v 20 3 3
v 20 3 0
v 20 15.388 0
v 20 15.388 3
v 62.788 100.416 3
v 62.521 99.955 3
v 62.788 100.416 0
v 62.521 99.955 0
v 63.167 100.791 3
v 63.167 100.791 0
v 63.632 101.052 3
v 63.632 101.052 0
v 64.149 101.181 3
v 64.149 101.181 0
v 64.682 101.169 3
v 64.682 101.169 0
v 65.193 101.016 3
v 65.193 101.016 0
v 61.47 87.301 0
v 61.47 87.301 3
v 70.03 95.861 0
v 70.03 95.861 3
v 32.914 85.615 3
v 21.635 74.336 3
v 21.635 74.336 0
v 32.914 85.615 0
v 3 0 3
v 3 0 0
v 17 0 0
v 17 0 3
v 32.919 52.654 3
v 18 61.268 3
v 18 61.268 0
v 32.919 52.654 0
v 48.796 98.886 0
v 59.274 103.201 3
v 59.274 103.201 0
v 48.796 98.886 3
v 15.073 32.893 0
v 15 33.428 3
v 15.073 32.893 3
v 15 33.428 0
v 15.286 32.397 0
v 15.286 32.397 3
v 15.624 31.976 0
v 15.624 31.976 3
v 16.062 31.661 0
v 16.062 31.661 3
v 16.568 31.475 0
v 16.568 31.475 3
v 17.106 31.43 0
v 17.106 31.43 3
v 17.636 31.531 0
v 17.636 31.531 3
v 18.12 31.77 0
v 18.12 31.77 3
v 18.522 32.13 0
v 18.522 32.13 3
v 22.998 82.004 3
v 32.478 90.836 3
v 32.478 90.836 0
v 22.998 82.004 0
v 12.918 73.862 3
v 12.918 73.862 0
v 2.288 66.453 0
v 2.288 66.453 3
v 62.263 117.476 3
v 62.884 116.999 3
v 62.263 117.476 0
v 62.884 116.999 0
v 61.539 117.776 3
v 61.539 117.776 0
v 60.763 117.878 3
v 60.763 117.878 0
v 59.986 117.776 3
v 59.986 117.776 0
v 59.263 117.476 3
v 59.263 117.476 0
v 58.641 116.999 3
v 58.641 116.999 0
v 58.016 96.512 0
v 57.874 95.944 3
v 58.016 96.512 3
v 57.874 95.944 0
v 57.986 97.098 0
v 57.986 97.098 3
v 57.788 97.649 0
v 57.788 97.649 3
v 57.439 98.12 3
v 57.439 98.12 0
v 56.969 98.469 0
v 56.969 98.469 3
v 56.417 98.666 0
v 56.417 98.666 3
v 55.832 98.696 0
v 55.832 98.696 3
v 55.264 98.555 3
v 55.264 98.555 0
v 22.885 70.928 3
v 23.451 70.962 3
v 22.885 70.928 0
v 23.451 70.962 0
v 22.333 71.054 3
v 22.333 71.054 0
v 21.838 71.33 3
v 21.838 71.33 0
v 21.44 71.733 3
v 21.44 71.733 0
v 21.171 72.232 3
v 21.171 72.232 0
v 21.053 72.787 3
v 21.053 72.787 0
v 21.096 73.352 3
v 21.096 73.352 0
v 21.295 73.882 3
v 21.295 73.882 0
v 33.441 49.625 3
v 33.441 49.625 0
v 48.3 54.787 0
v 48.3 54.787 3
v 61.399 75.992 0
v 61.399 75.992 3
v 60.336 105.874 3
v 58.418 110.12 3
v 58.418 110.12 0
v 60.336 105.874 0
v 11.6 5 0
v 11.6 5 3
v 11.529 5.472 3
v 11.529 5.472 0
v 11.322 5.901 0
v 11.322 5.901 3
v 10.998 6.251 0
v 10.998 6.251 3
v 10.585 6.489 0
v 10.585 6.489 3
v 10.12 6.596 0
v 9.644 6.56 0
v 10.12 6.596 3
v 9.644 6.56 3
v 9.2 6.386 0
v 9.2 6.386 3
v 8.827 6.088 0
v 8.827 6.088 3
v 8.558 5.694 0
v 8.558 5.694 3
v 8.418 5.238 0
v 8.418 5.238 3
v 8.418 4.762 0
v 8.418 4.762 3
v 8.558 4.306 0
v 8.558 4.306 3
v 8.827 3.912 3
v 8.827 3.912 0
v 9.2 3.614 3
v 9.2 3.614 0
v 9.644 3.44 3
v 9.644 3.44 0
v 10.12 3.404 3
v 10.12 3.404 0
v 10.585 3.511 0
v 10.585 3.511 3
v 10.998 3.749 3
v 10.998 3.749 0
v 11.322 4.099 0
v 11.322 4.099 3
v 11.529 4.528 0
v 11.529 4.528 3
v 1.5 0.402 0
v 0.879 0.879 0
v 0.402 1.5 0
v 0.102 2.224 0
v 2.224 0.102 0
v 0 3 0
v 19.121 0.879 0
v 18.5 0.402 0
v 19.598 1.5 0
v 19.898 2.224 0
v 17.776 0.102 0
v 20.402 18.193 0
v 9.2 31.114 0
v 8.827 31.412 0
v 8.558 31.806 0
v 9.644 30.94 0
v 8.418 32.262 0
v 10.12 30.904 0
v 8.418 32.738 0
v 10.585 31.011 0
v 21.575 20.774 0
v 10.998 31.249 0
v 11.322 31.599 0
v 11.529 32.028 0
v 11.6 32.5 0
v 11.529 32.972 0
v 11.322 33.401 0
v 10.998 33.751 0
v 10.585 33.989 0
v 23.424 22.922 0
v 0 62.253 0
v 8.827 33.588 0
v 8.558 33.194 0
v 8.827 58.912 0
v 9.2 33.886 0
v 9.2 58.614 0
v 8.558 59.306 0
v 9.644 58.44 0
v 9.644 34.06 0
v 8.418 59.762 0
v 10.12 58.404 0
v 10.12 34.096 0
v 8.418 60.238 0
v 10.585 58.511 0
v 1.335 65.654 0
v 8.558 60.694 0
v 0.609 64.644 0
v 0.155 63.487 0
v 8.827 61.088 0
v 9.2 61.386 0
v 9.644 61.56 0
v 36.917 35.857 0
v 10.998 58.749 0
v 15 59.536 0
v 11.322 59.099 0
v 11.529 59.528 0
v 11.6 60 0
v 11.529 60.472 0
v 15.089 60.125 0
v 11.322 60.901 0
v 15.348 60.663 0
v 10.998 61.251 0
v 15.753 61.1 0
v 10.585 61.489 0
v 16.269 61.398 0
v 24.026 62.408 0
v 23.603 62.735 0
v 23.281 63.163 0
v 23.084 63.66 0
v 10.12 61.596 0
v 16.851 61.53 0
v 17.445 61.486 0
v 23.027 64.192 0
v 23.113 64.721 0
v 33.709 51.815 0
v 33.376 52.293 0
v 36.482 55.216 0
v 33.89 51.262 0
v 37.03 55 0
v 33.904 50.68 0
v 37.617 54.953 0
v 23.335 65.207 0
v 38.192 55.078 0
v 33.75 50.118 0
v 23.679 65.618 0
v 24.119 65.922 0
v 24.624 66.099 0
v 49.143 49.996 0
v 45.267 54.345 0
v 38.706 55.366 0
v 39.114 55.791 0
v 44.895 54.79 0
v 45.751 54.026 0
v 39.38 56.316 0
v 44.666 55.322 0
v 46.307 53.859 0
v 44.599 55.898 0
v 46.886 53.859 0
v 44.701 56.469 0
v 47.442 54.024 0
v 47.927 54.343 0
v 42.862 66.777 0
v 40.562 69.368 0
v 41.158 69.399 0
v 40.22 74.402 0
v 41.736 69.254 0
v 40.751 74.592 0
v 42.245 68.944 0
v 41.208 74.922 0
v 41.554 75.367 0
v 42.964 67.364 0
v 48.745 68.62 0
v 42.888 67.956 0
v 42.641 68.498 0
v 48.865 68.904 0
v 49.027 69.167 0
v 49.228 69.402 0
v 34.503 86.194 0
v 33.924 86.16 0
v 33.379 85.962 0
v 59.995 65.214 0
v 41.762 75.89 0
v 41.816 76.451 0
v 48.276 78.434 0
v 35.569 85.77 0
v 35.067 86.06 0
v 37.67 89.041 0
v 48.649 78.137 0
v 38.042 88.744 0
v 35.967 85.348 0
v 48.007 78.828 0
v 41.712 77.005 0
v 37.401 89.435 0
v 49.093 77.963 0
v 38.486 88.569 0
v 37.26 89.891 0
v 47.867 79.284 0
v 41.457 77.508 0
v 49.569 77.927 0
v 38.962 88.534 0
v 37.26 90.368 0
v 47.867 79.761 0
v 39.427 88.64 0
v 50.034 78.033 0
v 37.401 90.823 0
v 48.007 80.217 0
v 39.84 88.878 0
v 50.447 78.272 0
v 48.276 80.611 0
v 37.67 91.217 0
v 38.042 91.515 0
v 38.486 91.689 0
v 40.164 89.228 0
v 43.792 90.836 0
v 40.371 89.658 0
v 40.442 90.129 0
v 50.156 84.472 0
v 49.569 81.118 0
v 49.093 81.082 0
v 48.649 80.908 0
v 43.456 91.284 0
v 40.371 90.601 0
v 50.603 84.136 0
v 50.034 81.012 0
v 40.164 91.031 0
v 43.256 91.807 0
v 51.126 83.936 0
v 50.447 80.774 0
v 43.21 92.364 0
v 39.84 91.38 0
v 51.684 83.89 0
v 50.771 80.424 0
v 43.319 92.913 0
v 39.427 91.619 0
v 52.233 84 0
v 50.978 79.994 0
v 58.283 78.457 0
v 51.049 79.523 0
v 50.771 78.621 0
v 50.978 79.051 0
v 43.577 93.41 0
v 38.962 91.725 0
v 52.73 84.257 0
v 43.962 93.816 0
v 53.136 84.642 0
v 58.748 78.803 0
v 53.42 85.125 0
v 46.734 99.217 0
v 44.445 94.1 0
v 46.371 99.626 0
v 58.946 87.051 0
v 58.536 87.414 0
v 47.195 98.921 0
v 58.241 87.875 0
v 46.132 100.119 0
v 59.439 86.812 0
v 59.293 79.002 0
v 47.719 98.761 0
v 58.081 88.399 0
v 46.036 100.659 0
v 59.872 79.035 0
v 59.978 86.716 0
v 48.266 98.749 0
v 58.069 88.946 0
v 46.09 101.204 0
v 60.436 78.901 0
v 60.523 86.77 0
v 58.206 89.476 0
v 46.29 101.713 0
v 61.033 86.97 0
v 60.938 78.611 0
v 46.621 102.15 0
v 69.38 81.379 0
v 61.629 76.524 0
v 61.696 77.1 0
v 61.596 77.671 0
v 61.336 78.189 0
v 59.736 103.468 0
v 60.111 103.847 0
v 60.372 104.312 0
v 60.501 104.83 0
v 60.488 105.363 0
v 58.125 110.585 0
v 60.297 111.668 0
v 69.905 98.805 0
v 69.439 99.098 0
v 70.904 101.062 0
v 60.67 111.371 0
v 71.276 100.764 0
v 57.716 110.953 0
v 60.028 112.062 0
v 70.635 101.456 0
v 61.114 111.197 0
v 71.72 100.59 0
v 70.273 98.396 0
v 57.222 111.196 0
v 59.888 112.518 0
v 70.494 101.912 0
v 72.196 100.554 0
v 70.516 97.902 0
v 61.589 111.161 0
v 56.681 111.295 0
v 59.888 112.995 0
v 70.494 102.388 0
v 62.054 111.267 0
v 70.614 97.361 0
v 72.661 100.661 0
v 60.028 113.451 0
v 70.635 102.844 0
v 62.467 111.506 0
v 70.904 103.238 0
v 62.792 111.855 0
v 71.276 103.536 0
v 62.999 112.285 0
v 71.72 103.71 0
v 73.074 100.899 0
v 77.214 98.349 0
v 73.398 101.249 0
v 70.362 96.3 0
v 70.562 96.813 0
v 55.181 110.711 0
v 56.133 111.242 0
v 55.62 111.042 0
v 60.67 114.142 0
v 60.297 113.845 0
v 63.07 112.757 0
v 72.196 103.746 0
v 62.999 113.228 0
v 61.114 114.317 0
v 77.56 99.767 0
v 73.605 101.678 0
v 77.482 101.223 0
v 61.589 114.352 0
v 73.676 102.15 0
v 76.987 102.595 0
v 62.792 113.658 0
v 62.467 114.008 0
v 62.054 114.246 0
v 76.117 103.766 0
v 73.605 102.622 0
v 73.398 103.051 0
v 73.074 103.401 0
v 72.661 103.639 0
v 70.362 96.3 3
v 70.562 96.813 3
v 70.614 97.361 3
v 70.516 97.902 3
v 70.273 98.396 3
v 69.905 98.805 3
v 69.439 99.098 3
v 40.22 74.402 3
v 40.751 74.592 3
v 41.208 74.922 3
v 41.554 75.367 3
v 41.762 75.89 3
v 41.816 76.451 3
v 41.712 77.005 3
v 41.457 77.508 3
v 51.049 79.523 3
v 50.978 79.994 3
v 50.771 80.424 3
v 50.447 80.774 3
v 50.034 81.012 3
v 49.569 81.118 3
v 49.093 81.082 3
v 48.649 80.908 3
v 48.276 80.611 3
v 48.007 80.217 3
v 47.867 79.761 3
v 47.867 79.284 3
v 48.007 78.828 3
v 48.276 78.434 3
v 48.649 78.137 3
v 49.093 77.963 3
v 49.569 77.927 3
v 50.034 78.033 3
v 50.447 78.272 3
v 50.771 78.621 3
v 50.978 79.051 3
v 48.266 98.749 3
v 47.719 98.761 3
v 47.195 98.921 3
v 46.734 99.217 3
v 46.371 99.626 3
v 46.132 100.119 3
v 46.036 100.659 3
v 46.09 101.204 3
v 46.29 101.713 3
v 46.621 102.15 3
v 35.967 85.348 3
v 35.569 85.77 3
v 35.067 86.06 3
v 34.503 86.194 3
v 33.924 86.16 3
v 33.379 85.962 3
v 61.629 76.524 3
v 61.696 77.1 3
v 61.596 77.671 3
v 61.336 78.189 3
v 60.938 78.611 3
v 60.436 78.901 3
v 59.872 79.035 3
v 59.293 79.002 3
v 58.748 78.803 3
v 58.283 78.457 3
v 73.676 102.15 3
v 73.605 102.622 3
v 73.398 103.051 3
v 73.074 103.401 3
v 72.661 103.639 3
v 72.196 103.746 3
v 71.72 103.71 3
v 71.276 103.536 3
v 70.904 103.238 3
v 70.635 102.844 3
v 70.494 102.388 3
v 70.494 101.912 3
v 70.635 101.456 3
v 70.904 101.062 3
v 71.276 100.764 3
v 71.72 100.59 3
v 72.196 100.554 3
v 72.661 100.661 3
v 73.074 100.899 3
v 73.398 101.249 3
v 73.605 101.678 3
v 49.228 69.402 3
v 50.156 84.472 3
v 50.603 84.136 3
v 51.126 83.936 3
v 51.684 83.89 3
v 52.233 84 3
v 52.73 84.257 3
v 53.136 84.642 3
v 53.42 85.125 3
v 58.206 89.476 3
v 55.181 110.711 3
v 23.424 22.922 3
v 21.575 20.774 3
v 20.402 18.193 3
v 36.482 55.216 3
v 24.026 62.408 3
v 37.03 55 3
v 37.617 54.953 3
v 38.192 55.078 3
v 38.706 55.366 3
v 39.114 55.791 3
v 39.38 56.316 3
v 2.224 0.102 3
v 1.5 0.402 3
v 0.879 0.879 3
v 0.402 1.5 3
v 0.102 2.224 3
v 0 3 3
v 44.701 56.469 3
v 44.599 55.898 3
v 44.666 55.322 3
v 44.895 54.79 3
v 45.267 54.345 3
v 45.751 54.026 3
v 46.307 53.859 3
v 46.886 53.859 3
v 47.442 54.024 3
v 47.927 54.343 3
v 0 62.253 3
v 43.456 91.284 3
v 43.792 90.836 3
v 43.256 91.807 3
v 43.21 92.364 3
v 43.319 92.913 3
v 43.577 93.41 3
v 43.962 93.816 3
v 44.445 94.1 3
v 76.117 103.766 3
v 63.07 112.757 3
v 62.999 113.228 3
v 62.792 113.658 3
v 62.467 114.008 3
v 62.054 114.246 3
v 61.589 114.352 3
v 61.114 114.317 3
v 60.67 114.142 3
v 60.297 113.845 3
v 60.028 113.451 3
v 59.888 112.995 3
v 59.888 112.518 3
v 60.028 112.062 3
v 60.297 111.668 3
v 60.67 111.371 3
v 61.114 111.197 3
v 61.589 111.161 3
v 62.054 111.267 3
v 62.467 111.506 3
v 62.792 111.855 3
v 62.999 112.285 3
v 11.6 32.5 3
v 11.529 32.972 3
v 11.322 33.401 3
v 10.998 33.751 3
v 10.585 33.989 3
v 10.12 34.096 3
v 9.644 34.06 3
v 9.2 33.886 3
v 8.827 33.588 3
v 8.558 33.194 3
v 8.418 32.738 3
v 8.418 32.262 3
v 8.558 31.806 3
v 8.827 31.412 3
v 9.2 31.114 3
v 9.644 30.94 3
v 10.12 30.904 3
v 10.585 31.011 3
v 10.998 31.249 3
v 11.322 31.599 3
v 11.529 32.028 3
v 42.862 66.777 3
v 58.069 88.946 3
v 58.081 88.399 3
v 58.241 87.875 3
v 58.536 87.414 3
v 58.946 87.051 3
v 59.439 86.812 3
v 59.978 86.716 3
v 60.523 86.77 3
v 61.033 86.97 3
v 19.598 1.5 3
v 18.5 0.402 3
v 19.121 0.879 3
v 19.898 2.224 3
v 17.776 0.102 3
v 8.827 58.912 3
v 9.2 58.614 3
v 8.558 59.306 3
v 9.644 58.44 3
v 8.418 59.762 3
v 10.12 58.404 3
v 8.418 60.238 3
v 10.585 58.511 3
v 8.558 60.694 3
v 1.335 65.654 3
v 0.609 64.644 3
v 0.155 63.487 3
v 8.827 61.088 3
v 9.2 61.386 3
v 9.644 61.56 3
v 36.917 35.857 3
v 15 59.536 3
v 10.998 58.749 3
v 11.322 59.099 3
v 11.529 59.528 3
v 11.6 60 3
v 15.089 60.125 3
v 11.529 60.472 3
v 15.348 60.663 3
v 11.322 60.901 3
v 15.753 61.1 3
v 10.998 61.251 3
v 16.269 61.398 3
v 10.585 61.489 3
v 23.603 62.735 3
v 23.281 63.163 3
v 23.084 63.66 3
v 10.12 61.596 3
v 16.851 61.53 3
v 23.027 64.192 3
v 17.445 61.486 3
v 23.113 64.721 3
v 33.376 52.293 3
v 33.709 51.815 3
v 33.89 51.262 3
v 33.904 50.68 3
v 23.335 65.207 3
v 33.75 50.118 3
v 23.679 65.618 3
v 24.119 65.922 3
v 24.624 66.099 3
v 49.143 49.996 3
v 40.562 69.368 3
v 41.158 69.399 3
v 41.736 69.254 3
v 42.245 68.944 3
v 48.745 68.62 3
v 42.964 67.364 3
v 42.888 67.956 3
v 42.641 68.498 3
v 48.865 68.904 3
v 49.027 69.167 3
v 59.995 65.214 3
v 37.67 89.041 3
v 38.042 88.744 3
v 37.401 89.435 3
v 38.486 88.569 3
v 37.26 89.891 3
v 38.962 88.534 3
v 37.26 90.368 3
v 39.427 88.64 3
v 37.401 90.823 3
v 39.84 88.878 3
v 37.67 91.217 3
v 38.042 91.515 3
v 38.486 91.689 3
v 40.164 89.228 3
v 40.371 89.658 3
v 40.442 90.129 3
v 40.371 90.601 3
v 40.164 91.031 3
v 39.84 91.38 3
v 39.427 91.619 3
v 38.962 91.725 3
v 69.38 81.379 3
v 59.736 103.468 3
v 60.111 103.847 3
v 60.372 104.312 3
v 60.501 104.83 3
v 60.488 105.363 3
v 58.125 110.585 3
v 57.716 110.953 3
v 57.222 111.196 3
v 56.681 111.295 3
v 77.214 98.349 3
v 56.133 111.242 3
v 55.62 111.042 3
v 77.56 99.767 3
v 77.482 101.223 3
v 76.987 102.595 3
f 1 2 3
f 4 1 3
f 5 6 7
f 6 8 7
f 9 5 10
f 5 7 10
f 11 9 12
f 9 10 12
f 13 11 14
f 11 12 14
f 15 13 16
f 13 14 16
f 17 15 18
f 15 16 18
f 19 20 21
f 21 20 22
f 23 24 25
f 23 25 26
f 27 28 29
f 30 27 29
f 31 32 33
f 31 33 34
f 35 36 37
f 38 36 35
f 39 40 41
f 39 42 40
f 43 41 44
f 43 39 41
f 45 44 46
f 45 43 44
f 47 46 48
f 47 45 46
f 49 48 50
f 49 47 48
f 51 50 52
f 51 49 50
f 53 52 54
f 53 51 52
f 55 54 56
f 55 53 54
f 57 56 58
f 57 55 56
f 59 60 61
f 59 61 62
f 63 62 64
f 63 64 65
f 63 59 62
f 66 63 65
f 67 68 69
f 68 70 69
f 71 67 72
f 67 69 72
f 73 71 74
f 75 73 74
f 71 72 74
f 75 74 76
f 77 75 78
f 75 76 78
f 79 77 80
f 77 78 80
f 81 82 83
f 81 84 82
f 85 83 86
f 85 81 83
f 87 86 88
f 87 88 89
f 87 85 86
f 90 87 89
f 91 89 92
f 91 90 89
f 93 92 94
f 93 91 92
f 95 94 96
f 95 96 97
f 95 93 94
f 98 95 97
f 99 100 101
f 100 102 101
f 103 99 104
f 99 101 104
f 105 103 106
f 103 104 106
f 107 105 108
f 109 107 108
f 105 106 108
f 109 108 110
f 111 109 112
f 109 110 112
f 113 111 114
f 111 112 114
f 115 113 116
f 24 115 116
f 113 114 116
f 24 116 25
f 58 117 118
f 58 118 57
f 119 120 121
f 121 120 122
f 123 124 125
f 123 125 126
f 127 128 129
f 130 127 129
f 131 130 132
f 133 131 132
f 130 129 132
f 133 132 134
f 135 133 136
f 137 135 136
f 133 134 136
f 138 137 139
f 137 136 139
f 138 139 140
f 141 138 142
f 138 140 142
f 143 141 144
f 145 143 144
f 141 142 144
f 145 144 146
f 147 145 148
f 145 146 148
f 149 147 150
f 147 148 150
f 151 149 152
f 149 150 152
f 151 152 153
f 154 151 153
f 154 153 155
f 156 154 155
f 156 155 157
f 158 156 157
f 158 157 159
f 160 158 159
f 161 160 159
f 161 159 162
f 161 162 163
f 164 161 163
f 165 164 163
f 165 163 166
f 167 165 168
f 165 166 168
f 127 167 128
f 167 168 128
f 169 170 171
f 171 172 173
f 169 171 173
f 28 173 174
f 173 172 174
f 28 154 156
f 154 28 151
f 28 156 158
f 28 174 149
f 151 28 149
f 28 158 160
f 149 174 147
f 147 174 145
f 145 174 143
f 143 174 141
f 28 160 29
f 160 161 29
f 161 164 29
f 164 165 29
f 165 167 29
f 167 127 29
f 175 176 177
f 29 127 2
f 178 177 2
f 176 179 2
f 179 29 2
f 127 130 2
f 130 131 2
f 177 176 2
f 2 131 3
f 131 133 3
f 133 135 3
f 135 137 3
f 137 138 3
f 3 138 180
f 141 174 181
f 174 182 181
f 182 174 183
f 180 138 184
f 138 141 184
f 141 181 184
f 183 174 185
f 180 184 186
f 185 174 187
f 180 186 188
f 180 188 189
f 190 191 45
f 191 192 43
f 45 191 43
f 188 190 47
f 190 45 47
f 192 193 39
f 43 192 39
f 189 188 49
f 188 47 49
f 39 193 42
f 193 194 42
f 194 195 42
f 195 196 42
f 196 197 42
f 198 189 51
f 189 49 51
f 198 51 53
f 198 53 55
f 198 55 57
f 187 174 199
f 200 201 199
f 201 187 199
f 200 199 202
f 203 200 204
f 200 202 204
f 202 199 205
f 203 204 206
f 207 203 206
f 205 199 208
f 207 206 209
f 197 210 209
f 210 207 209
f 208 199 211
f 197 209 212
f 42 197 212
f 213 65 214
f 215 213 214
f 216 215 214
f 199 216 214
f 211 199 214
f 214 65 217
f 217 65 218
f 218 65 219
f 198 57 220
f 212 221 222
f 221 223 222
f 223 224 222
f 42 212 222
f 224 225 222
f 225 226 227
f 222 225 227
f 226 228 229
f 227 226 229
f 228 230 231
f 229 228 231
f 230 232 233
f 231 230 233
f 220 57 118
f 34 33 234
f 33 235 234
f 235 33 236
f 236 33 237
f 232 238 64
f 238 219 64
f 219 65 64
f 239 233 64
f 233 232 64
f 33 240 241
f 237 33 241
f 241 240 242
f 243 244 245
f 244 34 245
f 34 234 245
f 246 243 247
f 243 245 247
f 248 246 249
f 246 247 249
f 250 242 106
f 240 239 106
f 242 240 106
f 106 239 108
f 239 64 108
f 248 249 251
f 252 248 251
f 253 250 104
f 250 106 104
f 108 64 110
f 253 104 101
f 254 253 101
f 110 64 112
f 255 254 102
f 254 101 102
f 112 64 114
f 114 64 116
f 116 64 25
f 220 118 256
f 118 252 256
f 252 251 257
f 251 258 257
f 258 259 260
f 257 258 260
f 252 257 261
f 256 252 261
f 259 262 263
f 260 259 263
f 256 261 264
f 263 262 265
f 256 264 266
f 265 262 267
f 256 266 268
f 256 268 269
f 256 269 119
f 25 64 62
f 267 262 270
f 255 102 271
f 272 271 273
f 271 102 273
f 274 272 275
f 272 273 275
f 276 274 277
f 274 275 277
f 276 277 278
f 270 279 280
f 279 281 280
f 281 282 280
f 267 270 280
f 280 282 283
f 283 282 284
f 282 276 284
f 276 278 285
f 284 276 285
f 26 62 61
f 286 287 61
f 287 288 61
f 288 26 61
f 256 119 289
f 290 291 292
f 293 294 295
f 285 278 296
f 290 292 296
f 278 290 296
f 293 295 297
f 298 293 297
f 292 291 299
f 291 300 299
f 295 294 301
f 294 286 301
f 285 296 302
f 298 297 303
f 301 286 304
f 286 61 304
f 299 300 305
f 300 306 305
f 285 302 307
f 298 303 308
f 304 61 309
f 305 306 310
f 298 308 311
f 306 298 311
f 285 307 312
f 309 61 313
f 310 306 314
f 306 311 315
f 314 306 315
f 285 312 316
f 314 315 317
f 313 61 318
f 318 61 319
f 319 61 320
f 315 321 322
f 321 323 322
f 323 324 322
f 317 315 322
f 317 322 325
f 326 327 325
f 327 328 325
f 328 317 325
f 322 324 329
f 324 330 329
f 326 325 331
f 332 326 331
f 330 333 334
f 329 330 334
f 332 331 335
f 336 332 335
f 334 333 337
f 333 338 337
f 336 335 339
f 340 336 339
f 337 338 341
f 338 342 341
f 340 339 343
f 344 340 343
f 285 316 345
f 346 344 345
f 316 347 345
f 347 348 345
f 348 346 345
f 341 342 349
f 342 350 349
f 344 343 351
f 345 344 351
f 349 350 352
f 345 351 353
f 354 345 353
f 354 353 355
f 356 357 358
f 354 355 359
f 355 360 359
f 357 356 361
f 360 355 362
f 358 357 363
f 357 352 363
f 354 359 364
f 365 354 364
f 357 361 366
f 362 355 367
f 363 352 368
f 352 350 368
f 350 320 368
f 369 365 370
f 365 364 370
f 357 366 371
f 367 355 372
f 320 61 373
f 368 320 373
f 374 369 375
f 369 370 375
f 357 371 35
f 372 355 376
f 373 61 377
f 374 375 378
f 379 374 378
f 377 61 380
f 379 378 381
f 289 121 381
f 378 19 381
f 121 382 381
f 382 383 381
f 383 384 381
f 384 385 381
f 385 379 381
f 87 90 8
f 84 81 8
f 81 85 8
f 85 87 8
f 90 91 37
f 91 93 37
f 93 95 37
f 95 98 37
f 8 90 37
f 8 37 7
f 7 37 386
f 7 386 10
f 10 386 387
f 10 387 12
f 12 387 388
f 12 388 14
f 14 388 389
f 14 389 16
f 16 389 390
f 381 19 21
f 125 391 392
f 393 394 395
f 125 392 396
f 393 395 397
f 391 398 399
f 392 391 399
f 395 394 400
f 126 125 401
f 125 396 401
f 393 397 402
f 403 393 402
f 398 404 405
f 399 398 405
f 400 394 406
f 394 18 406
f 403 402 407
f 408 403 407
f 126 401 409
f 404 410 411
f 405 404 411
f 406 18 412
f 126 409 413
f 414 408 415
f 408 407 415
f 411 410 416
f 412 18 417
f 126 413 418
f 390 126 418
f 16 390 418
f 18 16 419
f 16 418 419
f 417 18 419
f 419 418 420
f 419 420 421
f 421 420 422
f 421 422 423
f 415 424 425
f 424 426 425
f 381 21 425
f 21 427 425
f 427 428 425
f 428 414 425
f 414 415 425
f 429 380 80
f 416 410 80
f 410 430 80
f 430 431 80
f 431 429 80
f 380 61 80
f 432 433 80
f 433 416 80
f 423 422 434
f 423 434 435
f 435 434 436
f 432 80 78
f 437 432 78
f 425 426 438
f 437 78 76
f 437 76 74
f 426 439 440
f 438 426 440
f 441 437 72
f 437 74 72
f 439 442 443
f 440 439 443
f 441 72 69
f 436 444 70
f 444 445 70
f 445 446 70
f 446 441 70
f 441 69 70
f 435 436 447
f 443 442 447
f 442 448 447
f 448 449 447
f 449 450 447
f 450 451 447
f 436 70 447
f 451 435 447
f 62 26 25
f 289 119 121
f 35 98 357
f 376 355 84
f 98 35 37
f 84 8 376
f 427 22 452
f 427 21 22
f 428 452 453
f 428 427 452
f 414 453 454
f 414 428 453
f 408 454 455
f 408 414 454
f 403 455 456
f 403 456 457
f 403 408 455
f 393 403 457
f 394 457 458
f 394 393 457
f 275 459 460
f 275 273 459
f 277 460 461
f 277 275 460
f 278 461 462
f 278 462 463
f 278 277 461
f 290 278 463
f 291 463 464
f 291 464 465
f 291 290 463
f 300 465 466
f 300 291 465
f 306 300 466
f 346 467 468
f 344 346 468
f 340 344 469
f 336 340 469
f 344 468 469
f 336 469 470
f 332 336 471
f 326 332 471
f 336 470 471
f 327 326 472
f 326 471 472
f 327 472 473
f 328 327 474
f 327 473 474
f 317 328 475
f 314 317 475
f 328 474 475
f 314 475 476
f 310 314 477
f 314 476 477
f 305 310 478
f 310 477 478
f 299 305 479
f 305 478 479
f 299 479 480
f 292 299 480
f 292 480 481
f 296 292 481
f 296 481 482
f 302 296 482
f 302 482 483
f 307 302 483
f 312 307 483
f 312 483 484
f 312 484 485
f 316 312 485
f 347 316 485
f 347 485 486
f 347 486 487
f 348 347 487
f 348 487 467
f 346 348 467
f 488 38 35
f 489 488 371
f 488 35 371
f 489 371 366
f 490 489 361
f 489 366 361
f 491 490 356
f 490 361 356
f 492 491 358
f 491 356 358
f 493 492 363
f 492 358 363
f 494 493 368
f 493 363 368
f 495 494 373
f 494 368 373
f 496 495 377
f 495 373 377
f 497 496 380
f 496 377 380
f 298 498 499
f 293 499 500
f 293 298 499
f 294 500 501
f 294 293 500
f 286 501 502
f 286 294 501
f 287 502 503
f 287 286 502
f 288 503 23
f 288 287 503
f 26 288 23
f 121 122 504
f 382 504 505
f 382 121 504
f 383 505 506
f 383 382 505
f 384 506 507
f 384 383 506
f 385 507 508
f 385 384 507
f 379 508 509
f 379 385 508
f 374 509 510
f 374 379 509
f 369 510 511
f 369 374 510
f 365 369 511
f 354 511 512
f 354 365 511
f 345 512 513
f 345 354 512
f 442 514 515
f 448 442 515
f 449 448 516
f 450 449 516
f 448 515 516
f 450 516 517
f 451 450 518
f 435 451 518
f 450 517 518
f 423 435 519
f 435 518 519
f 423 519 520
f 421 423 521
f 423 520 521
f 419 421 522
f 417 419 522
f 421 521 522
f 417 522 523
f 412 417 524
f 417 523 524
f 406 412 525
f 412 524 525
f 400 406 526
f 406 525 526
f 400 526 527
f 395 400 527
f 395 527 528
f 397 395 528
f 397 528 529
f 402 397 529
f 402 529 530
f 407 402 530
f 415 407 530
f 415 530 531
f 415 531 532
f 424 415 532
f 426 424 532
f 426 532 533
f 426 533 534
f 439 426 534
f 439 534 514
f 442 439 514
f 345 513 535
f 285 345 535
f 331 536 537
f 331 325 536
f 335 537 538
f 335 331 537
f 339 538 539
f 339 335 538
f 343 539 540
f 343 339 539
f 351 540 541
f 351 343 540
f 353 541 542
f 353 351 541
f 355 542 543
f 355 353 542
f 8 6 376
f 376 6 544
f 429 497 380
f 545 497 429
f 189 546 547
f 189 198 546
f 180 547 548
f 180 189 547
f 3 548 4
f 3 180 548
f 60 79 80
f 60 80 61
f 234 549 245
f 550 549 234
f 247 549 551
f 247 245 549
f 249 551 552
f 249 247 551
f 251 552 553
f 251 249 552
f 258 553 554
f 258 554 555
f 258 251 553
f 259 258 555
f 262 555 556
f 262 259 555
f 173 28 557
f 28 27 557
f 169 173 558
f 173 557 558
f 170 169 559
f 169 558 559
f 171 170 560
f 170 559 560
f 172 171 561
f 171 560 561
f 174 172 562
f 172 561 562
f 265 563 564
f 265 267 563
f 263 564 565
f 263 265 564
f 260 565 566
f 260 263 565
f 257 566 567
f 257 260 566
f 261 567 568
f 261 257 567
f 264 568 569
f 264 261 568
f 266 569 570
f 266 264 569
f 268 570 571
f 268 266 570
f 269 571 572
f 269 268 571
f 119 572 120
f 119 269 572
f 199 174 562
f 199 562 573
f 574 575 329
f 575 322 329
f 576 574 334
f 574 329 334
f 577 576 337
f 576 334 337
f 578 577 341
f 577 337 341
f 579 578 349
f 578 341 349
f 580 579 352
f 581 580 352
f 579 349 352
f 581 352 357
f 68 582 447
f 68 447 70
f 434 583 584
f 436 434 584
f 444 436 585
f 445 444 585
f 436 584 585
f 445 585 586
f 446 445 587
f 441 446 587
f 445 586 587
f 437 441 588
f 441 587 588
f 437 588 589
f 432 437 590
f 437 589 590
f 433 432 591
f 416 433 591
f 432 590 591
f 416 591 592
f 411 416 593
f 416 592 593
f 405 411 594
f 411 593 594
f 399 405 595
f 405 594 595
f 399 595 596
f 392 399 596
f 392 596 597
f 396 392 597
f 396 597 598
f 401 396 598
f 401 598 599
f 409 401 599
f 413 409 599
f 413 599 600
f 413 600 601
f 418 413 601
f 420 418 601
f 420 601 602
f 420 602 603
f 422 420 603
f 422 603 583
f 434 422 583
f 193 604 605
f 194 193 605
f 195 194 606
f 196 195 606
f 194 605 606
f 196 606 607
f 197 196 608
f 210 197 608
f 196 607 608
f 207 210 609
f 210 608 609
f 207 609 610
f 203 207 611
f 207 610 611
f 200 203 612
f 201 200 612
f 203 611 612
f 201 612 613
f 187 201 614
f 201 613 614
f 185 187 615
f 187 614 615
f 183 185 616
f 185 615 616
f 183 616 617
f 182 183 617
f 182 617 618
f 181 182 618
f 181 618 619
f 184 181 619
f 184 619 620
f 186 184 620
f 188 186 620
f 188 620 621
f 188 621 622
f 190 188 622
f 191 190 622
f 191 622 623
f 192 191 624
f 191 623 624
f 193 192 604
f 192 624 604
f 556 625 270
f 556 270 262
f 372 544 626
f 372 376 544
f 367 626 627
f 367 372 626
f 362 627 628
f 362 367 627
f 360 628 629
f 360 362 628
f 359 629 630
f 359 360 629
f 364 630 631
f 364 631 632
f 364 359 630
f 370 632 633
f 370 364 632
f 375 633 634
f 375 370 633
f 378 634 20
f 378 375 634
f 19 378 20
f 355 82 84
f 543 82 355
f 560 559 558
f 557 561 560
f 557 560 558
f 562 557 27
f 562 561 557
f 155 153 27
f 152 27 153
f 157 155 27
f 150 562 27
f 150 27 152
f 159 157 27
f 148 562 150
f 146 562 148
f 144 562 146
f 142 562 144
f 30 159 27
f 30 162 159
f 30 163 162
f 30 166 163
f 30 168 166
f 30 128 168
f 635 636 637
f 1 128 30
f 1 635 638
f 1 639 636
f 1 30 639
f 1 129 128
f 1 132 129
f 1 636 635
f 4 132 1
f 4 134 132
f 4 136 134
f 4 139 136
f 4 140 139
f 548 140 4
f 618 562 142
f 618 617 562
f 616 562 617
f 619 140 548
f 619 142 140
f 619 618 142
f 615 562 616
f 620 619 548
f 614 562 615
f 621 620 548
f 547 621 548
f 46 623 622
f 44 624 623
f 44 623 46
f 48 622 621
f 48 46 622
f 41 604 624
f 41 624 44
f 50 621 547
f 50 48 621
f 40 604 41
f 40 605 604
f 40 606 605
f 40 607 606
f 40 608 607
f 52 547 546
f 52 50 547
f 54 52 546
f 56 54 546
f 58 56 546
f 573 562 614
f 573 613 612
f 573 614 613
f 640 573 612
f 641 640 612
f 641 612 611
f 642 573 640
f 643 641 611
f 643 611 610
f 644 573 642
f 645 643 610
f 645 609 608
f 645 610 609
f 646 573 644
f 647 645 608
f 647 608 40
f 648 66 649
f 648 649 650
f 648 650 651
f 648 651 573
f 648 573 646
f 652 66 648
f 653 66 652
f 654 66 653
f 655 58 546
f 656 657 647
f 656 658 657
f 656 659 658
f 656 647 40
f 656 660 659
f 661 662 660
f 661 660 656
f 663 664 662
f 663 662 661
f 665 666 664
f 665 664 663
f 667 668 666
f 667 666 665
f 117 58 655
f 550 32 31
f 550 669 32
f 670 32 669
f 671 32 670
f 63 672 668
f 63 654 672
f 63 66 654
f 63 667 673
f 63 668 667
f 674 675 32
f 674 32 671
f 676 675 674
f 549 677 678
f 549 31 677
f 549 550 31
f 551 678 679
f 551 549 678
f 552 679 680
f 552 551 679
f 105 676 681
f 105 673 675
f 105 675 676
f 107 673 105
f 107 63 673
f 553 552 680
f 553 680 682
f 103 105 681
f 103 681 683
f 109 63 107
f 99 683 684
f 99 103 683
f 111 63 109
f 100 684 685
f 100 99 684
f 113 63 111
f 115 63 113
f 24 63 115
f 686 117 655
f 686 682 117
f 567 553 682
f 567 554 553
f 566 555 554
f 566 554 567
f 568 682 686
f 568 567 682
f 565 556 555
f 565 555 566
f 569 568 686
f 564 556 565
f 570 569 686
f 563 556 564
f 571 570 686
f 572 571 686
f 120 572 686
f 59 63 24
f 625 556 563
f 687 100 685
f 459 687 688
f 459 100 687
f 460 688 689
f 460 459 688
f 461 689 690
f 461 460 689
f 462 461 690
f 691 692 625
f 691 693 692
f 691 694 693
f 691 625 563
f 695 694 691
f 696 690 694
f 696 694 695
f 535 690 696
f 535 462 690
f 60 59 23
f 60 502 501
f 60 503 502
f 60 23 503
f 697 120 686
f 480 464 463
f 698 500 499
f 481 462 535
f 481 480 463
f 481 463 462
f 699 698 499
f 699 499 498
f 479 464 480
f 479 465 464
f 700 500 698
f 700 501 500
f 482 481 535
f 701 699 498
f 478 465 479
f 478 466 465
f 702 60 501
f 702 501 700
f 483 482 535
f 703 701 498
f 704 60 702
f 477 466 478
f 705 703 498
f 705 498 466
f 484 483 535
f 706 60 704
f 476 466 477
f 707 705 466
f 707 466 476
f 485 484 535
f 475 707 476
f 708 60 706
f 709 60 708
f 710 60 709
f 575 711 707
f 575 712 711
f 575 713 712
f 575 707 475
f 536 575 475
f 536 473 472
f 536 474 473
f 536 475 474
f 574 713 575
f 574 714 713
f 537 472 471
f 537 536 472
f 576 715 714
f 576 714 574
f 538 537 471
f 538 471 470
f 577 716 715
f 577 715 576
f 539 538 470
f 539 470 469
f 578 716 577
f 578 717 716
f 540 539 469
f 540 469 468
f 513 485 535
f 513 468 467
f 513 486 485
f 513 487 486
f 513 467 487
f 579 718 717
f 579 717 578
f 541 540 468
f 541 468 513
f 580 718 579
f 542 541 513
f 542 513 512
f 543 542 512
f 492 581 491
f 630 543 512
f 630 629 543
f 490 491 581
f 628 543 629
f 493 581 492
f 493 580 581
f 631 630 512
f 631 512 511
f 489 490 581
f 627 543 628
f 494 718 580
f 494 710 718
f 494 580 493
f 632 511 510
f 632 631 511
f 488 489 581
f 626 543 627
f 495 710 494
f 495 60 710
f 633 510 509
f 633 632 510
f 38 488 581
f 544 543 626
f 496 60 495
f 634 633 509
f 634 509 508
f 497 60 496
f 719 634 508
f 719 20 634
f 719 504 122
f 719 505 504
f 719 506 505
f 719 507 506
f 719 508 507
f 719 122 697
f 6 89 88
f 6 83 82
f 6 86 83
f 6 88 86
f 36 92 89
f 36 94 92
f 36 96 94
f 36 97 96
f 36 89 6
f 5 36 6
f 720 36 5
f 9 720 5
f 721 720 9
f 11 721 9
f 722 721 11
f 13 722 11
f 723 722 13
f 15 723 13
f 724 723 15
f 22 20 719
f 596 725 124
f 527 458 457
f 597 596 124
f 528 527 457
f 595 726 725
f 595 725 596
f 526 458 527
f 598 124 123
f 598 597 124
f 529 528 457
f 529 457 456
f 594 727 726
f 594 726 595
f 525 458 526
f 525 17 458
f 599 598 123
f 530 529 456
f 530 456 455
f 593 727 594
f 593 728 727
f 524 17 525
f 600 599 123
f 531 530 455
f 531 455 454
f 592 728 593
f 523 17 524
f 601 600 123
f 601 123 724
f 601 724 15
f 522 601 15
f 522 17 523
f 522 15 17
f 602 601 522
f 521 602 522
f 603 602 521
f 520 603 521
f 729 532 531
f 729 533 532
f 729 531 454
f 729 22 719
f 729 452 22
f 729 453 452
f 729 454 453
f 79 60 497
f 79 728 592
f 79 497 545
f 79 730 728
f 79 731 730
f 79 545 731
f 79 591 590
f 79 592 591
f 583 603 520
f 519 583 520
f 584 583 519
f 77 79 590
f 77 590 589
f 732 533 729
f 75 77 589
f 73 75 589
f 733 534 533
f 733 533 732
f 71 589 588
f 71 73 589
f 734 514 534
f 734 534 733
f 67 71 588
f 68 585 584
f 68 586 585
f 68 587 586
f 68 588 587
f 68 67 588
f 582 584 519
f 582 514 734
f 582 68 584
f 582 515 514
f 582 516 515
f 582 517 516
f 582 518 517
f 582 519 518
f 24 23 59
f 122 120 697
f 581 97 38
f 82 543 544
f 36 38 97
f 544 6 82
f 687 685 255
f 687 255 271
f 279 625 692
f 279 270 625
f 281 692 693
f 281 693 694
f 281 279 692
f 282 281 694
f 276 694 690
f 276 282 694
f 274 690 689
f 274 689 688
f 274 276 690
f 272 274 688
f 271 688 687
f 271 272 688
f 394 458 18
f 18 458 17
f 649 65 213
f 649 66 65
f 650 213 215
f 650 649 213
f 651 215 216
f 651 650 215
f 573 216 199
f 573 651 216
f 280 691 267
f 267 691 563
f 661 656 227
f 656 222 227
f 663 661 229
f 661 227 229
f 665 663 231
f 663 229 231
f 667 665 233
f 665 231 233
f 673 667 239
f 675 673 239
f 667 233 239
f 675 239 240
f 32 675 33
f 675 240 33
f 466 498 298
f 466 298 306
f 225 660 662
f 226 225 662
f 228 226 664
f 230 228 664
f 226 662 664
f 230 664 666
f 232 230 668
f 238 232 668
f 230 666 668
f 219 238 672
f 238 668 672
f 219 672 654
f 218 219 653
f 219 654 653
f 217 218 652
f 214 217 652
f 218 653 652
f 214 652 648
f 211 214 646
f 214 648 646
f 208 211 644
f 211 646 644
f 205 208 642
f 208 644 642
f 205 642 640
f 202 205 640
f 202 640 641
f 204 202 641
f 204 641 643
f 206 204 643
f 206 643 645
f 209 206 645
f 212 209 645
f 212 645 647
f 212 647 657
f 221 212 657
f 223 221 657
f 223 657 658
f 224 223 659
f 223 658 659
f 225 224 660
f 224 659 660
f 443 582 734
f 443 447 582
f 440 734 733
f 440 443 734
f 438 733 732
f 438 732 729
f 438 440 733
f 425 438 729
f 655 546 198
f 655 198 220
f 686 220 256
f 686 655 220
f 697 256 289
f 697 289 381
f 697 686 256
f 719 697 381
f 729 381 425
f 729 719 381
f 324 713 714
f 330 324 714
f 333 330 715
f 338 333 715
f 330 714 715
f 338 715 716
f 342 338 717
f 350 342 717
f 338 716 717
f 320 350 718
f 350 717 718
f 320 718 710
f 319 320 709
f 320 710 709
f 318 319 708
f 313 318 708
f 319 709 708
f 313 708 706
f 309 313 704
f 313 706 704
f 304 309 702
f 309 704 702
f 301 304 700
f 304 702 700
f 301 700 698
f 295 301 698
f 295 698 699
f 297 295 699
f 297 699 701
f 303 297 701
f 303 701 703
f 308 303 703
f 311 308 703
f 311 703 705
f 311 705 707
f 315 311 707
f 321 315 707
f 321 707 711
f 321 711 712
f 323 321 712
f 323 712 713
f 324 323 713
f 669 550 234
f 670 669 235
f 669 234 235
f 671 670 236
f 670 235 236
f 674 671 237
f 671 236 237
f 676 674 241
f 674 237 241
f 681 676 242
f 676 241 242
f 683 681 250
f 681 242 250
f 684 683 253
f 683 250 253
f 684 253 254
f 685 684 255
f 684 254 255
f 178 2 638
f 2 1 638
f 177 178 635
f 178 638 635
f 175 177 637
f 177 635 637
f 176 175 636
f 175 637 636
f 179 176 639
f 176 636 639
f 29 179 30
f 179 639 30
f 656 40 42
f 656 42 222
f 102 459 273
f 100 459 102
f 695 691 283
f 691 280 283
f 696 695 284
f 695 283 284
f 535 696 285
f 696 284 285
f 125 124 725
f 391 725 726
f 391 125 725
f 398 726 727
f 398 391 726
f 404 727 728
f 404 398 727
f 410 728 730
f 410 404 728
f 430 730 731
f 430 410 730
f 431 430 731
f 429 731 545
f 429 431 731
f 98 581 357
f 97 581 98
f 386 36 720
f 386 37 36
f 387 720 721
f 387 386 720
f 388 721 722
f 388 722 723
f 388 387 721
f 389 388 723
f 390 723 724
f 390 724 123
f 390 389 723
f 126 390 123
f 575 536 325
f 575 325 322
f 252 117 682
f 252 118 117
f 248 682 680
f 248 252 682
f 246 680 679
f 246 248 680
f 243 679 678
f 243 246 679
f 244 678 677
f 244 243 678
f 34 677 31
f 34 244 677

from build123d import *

# Parameters (mm, degrees)
SKETCH_1_W          = 20
SKETCH_1_H          = 65
EXTRUDE_1_DEPTH     = 3
SKETCH_2_R          = 1.6
CUT_EXTRUDE_1_DEPTH = 3
EXTRUDE_2_DEPTH     = 3
EXTRUDE_3_DEPTH     = 3
SKETCH_8_R          = 1.6
CUT_EXTRUDE_3_DEPTH = 143.659058168
FILLET_1_R          = 10
FILLET_2_R          = 3
FILLET_3_R          = 5
CUT_EXTRUDE_4_DEPTH = 142.149179722
FILLET_4_R          = 2


with BuildPart() as part:
    # 草图1 → 凸台-拉伸1 (new body)
    with BuildSketch(Plane.XY):
        with Locations((10, 32.5)):
            Rectangle(SKETCH_1_W, SKETCH_1_H)
    extrude(amount=EXTRUDE_1_DEPTH)

    # 草图2 → 切除-拉伸1 (cut)
    with BuildSketch(Plane.XY.offset(3)):
        with Locations((10, 60)):
            Circle(SKETCH_2_R)
        with Locations((10, 32.5)):
            Circle(SKETCH_2_R)
        with Locations((10, 5)):
            Circle(SKETCH_2_R)
    extrude(amount=-CUT_EXTRUDE_1_DEPTH, mode=Mode.SUBTRACT)



with BuildPart() as body_2:
    # 草图3 → 凸台-拉伸2 (new body)
    with BuildSketch(Plane.XY.offset(3)):
        Polygon((32.478445072, 90.836309448), (50.156114601, 73.158639918), (78.440385849, 101.442911166), (60.762716319, 119.120580695), align=None)
    extrude(amount=-EXTRUDE_2_DEPTH)


with BuildPart() as part_1:
    add(part.part)

    add(body_2.part)  # 凸台-拉伸3 merges body 2
    # 草图4 → 凸台-拉伸3 (add)
    with BuildSketch(Plane.XY.offset(3)):
        with BuildLine():
            Line((78.440385849, 101.442911166), (50.156114601, 73.158639918))
            Line((50.156114601, 73.158639918), (32.478445072, 90.836309448))
            ThreePointArc((32.478445072, 90.836309448), (16.972550072, 76.996299451), (0, 65))
            Line((0, 65), (20, 65))
            Line((20, 65), (20, 20))
            ThreePointArc((20, 20), (54.405363127, 57.00077145), (78.440385849, 101.442911166))
        make_face()
    extrude(amount=-EXTRUDE_3_DEPTH)

    # 草图8 → 切除-拉伸3 (cut, through all)
    with BuildSketch(Plane.XY.offset(3)):
        with Locations((61.4698231, 112.756619665)):
            Circle(SKETCH_8_R)
        with Locations((72.076424818, 102.150017947)):
            Circle(SKETCH_8_R)
        with Locations((49.44900782, 79.522600949)):
            Circle(SKETCH_8_R)
        with Locations((38.842406102, 90.129202667)):
            Circle(SKETCH_8_R)
    extrude(amount=-CUT_EXTRUDE_3_DEPTH, mode=Mode.SUBTRACT)

    # 圆角1
    fillet_1_edges = [part_1.edges().sort_by_distance(p)[0] for p in [
        (20, 20, 1.5),
    ]]
    fillet(fillet_1_edges, radius=FILLET_1_R)

    # 圆角2
    fillet_2_edges = [part_1.edges().sort_by_distance(p)[0] for p in [
        (60.762716319, 119.120580695, 1.5),
        (20, 0, 1.5),
        (0, 0, 1.5),
    ]]
    fillet(fillet_2_edges, radius=FILLET_2_R)

    # 圆角3
    fillet_3_edges = [part_1.edges().sort_by_distance(p)[0] for p in [
        (78.440385849, 101.442911166, 1.5),
        (0, 65, 1.5),
    ]]
    fillet(fillet_3_edges, radius=FILLET_3_R)

    # 草图10 → 切除-拉伸4 (cut, through all)
    with BuildSketch(Plane.XY.offset(3)):
        Polygon((16.922095886, 69.623106012), (34.599765415, 87.300775542), (43.20341196, 75.013494878), align=None)
        Polygon((19.465452368, 65.040672027), (43.955639167, 70.06369408), (38.60577187, 53.99000341), align=None)
        Polygon((15, 63), (35, 51.452994616), (15, 28), align=None)
        Polygon((39.549512883, 95.078950135), (57.227182413, 112.756619665), (61.186980388, 103.988495578), align=None)
        Polygon((41.670833227, 92.957629791), (59.702056147, 100.382250994), (52.277434945, 82.351028074), align=None)
        Polygon((63.308300731, 101.867175234), (54.398755288, 80.22970773), (72.076424818, 97.90737726), align=None)
        Polygon((48.893917057, 69.06801525), (39.281396308, 40.187170828), (70.417203629, 90.591301821), align=None)
    extrude(amount=-CUT_EXTRUDE_4_DEPTH, mode=Mode.SUBTRACT)

    # 圆角4
    fillet_4_edges = [part_1.edges().sort_by_distance(p)[0] for p in [
        (15, 28, 1.5),
        (15, 63, 1.5),
        (35, 51.452994616, 1.5),
        (38.60577187, 53.99000341, 1.5),
        (19.465452368, 65.040672027, 1.5),
        (43.955639167, 70.06369408, 1.5),
        (52.277434945, 82.351028074, 1.5),
        (41.670833227, 92.957629791, 1.5),
        (59.702056147, 100.382250994, 1.5),
        (61.186980388, 103.988495578, 1.5),
        (39.549512883, 95.078950135, 1.5),
        (57.227182413, 112.756619665, 1.5),
        (48.893917057, 69.06801525, 1.5),
        (70.417203629, 90.591301821, 1.5),
        (39.281396308, 40.187170828, 1.5),
        (63.308300731, 101.867175234, 1.5),
        (72.076424818, 97.90737726, 1.5),
        (54.398755288, 80.22970773, 1.5),
        (43.20341196, 75.013494878, 1.5),
        (16.922095886, 69.623106012, 1.5),
        (34.599765415, 87.300775542, 1.5),
    ]]
    fillet(fillet_4_edges, radius=FILLET_4_R)


solid = part_1.part
